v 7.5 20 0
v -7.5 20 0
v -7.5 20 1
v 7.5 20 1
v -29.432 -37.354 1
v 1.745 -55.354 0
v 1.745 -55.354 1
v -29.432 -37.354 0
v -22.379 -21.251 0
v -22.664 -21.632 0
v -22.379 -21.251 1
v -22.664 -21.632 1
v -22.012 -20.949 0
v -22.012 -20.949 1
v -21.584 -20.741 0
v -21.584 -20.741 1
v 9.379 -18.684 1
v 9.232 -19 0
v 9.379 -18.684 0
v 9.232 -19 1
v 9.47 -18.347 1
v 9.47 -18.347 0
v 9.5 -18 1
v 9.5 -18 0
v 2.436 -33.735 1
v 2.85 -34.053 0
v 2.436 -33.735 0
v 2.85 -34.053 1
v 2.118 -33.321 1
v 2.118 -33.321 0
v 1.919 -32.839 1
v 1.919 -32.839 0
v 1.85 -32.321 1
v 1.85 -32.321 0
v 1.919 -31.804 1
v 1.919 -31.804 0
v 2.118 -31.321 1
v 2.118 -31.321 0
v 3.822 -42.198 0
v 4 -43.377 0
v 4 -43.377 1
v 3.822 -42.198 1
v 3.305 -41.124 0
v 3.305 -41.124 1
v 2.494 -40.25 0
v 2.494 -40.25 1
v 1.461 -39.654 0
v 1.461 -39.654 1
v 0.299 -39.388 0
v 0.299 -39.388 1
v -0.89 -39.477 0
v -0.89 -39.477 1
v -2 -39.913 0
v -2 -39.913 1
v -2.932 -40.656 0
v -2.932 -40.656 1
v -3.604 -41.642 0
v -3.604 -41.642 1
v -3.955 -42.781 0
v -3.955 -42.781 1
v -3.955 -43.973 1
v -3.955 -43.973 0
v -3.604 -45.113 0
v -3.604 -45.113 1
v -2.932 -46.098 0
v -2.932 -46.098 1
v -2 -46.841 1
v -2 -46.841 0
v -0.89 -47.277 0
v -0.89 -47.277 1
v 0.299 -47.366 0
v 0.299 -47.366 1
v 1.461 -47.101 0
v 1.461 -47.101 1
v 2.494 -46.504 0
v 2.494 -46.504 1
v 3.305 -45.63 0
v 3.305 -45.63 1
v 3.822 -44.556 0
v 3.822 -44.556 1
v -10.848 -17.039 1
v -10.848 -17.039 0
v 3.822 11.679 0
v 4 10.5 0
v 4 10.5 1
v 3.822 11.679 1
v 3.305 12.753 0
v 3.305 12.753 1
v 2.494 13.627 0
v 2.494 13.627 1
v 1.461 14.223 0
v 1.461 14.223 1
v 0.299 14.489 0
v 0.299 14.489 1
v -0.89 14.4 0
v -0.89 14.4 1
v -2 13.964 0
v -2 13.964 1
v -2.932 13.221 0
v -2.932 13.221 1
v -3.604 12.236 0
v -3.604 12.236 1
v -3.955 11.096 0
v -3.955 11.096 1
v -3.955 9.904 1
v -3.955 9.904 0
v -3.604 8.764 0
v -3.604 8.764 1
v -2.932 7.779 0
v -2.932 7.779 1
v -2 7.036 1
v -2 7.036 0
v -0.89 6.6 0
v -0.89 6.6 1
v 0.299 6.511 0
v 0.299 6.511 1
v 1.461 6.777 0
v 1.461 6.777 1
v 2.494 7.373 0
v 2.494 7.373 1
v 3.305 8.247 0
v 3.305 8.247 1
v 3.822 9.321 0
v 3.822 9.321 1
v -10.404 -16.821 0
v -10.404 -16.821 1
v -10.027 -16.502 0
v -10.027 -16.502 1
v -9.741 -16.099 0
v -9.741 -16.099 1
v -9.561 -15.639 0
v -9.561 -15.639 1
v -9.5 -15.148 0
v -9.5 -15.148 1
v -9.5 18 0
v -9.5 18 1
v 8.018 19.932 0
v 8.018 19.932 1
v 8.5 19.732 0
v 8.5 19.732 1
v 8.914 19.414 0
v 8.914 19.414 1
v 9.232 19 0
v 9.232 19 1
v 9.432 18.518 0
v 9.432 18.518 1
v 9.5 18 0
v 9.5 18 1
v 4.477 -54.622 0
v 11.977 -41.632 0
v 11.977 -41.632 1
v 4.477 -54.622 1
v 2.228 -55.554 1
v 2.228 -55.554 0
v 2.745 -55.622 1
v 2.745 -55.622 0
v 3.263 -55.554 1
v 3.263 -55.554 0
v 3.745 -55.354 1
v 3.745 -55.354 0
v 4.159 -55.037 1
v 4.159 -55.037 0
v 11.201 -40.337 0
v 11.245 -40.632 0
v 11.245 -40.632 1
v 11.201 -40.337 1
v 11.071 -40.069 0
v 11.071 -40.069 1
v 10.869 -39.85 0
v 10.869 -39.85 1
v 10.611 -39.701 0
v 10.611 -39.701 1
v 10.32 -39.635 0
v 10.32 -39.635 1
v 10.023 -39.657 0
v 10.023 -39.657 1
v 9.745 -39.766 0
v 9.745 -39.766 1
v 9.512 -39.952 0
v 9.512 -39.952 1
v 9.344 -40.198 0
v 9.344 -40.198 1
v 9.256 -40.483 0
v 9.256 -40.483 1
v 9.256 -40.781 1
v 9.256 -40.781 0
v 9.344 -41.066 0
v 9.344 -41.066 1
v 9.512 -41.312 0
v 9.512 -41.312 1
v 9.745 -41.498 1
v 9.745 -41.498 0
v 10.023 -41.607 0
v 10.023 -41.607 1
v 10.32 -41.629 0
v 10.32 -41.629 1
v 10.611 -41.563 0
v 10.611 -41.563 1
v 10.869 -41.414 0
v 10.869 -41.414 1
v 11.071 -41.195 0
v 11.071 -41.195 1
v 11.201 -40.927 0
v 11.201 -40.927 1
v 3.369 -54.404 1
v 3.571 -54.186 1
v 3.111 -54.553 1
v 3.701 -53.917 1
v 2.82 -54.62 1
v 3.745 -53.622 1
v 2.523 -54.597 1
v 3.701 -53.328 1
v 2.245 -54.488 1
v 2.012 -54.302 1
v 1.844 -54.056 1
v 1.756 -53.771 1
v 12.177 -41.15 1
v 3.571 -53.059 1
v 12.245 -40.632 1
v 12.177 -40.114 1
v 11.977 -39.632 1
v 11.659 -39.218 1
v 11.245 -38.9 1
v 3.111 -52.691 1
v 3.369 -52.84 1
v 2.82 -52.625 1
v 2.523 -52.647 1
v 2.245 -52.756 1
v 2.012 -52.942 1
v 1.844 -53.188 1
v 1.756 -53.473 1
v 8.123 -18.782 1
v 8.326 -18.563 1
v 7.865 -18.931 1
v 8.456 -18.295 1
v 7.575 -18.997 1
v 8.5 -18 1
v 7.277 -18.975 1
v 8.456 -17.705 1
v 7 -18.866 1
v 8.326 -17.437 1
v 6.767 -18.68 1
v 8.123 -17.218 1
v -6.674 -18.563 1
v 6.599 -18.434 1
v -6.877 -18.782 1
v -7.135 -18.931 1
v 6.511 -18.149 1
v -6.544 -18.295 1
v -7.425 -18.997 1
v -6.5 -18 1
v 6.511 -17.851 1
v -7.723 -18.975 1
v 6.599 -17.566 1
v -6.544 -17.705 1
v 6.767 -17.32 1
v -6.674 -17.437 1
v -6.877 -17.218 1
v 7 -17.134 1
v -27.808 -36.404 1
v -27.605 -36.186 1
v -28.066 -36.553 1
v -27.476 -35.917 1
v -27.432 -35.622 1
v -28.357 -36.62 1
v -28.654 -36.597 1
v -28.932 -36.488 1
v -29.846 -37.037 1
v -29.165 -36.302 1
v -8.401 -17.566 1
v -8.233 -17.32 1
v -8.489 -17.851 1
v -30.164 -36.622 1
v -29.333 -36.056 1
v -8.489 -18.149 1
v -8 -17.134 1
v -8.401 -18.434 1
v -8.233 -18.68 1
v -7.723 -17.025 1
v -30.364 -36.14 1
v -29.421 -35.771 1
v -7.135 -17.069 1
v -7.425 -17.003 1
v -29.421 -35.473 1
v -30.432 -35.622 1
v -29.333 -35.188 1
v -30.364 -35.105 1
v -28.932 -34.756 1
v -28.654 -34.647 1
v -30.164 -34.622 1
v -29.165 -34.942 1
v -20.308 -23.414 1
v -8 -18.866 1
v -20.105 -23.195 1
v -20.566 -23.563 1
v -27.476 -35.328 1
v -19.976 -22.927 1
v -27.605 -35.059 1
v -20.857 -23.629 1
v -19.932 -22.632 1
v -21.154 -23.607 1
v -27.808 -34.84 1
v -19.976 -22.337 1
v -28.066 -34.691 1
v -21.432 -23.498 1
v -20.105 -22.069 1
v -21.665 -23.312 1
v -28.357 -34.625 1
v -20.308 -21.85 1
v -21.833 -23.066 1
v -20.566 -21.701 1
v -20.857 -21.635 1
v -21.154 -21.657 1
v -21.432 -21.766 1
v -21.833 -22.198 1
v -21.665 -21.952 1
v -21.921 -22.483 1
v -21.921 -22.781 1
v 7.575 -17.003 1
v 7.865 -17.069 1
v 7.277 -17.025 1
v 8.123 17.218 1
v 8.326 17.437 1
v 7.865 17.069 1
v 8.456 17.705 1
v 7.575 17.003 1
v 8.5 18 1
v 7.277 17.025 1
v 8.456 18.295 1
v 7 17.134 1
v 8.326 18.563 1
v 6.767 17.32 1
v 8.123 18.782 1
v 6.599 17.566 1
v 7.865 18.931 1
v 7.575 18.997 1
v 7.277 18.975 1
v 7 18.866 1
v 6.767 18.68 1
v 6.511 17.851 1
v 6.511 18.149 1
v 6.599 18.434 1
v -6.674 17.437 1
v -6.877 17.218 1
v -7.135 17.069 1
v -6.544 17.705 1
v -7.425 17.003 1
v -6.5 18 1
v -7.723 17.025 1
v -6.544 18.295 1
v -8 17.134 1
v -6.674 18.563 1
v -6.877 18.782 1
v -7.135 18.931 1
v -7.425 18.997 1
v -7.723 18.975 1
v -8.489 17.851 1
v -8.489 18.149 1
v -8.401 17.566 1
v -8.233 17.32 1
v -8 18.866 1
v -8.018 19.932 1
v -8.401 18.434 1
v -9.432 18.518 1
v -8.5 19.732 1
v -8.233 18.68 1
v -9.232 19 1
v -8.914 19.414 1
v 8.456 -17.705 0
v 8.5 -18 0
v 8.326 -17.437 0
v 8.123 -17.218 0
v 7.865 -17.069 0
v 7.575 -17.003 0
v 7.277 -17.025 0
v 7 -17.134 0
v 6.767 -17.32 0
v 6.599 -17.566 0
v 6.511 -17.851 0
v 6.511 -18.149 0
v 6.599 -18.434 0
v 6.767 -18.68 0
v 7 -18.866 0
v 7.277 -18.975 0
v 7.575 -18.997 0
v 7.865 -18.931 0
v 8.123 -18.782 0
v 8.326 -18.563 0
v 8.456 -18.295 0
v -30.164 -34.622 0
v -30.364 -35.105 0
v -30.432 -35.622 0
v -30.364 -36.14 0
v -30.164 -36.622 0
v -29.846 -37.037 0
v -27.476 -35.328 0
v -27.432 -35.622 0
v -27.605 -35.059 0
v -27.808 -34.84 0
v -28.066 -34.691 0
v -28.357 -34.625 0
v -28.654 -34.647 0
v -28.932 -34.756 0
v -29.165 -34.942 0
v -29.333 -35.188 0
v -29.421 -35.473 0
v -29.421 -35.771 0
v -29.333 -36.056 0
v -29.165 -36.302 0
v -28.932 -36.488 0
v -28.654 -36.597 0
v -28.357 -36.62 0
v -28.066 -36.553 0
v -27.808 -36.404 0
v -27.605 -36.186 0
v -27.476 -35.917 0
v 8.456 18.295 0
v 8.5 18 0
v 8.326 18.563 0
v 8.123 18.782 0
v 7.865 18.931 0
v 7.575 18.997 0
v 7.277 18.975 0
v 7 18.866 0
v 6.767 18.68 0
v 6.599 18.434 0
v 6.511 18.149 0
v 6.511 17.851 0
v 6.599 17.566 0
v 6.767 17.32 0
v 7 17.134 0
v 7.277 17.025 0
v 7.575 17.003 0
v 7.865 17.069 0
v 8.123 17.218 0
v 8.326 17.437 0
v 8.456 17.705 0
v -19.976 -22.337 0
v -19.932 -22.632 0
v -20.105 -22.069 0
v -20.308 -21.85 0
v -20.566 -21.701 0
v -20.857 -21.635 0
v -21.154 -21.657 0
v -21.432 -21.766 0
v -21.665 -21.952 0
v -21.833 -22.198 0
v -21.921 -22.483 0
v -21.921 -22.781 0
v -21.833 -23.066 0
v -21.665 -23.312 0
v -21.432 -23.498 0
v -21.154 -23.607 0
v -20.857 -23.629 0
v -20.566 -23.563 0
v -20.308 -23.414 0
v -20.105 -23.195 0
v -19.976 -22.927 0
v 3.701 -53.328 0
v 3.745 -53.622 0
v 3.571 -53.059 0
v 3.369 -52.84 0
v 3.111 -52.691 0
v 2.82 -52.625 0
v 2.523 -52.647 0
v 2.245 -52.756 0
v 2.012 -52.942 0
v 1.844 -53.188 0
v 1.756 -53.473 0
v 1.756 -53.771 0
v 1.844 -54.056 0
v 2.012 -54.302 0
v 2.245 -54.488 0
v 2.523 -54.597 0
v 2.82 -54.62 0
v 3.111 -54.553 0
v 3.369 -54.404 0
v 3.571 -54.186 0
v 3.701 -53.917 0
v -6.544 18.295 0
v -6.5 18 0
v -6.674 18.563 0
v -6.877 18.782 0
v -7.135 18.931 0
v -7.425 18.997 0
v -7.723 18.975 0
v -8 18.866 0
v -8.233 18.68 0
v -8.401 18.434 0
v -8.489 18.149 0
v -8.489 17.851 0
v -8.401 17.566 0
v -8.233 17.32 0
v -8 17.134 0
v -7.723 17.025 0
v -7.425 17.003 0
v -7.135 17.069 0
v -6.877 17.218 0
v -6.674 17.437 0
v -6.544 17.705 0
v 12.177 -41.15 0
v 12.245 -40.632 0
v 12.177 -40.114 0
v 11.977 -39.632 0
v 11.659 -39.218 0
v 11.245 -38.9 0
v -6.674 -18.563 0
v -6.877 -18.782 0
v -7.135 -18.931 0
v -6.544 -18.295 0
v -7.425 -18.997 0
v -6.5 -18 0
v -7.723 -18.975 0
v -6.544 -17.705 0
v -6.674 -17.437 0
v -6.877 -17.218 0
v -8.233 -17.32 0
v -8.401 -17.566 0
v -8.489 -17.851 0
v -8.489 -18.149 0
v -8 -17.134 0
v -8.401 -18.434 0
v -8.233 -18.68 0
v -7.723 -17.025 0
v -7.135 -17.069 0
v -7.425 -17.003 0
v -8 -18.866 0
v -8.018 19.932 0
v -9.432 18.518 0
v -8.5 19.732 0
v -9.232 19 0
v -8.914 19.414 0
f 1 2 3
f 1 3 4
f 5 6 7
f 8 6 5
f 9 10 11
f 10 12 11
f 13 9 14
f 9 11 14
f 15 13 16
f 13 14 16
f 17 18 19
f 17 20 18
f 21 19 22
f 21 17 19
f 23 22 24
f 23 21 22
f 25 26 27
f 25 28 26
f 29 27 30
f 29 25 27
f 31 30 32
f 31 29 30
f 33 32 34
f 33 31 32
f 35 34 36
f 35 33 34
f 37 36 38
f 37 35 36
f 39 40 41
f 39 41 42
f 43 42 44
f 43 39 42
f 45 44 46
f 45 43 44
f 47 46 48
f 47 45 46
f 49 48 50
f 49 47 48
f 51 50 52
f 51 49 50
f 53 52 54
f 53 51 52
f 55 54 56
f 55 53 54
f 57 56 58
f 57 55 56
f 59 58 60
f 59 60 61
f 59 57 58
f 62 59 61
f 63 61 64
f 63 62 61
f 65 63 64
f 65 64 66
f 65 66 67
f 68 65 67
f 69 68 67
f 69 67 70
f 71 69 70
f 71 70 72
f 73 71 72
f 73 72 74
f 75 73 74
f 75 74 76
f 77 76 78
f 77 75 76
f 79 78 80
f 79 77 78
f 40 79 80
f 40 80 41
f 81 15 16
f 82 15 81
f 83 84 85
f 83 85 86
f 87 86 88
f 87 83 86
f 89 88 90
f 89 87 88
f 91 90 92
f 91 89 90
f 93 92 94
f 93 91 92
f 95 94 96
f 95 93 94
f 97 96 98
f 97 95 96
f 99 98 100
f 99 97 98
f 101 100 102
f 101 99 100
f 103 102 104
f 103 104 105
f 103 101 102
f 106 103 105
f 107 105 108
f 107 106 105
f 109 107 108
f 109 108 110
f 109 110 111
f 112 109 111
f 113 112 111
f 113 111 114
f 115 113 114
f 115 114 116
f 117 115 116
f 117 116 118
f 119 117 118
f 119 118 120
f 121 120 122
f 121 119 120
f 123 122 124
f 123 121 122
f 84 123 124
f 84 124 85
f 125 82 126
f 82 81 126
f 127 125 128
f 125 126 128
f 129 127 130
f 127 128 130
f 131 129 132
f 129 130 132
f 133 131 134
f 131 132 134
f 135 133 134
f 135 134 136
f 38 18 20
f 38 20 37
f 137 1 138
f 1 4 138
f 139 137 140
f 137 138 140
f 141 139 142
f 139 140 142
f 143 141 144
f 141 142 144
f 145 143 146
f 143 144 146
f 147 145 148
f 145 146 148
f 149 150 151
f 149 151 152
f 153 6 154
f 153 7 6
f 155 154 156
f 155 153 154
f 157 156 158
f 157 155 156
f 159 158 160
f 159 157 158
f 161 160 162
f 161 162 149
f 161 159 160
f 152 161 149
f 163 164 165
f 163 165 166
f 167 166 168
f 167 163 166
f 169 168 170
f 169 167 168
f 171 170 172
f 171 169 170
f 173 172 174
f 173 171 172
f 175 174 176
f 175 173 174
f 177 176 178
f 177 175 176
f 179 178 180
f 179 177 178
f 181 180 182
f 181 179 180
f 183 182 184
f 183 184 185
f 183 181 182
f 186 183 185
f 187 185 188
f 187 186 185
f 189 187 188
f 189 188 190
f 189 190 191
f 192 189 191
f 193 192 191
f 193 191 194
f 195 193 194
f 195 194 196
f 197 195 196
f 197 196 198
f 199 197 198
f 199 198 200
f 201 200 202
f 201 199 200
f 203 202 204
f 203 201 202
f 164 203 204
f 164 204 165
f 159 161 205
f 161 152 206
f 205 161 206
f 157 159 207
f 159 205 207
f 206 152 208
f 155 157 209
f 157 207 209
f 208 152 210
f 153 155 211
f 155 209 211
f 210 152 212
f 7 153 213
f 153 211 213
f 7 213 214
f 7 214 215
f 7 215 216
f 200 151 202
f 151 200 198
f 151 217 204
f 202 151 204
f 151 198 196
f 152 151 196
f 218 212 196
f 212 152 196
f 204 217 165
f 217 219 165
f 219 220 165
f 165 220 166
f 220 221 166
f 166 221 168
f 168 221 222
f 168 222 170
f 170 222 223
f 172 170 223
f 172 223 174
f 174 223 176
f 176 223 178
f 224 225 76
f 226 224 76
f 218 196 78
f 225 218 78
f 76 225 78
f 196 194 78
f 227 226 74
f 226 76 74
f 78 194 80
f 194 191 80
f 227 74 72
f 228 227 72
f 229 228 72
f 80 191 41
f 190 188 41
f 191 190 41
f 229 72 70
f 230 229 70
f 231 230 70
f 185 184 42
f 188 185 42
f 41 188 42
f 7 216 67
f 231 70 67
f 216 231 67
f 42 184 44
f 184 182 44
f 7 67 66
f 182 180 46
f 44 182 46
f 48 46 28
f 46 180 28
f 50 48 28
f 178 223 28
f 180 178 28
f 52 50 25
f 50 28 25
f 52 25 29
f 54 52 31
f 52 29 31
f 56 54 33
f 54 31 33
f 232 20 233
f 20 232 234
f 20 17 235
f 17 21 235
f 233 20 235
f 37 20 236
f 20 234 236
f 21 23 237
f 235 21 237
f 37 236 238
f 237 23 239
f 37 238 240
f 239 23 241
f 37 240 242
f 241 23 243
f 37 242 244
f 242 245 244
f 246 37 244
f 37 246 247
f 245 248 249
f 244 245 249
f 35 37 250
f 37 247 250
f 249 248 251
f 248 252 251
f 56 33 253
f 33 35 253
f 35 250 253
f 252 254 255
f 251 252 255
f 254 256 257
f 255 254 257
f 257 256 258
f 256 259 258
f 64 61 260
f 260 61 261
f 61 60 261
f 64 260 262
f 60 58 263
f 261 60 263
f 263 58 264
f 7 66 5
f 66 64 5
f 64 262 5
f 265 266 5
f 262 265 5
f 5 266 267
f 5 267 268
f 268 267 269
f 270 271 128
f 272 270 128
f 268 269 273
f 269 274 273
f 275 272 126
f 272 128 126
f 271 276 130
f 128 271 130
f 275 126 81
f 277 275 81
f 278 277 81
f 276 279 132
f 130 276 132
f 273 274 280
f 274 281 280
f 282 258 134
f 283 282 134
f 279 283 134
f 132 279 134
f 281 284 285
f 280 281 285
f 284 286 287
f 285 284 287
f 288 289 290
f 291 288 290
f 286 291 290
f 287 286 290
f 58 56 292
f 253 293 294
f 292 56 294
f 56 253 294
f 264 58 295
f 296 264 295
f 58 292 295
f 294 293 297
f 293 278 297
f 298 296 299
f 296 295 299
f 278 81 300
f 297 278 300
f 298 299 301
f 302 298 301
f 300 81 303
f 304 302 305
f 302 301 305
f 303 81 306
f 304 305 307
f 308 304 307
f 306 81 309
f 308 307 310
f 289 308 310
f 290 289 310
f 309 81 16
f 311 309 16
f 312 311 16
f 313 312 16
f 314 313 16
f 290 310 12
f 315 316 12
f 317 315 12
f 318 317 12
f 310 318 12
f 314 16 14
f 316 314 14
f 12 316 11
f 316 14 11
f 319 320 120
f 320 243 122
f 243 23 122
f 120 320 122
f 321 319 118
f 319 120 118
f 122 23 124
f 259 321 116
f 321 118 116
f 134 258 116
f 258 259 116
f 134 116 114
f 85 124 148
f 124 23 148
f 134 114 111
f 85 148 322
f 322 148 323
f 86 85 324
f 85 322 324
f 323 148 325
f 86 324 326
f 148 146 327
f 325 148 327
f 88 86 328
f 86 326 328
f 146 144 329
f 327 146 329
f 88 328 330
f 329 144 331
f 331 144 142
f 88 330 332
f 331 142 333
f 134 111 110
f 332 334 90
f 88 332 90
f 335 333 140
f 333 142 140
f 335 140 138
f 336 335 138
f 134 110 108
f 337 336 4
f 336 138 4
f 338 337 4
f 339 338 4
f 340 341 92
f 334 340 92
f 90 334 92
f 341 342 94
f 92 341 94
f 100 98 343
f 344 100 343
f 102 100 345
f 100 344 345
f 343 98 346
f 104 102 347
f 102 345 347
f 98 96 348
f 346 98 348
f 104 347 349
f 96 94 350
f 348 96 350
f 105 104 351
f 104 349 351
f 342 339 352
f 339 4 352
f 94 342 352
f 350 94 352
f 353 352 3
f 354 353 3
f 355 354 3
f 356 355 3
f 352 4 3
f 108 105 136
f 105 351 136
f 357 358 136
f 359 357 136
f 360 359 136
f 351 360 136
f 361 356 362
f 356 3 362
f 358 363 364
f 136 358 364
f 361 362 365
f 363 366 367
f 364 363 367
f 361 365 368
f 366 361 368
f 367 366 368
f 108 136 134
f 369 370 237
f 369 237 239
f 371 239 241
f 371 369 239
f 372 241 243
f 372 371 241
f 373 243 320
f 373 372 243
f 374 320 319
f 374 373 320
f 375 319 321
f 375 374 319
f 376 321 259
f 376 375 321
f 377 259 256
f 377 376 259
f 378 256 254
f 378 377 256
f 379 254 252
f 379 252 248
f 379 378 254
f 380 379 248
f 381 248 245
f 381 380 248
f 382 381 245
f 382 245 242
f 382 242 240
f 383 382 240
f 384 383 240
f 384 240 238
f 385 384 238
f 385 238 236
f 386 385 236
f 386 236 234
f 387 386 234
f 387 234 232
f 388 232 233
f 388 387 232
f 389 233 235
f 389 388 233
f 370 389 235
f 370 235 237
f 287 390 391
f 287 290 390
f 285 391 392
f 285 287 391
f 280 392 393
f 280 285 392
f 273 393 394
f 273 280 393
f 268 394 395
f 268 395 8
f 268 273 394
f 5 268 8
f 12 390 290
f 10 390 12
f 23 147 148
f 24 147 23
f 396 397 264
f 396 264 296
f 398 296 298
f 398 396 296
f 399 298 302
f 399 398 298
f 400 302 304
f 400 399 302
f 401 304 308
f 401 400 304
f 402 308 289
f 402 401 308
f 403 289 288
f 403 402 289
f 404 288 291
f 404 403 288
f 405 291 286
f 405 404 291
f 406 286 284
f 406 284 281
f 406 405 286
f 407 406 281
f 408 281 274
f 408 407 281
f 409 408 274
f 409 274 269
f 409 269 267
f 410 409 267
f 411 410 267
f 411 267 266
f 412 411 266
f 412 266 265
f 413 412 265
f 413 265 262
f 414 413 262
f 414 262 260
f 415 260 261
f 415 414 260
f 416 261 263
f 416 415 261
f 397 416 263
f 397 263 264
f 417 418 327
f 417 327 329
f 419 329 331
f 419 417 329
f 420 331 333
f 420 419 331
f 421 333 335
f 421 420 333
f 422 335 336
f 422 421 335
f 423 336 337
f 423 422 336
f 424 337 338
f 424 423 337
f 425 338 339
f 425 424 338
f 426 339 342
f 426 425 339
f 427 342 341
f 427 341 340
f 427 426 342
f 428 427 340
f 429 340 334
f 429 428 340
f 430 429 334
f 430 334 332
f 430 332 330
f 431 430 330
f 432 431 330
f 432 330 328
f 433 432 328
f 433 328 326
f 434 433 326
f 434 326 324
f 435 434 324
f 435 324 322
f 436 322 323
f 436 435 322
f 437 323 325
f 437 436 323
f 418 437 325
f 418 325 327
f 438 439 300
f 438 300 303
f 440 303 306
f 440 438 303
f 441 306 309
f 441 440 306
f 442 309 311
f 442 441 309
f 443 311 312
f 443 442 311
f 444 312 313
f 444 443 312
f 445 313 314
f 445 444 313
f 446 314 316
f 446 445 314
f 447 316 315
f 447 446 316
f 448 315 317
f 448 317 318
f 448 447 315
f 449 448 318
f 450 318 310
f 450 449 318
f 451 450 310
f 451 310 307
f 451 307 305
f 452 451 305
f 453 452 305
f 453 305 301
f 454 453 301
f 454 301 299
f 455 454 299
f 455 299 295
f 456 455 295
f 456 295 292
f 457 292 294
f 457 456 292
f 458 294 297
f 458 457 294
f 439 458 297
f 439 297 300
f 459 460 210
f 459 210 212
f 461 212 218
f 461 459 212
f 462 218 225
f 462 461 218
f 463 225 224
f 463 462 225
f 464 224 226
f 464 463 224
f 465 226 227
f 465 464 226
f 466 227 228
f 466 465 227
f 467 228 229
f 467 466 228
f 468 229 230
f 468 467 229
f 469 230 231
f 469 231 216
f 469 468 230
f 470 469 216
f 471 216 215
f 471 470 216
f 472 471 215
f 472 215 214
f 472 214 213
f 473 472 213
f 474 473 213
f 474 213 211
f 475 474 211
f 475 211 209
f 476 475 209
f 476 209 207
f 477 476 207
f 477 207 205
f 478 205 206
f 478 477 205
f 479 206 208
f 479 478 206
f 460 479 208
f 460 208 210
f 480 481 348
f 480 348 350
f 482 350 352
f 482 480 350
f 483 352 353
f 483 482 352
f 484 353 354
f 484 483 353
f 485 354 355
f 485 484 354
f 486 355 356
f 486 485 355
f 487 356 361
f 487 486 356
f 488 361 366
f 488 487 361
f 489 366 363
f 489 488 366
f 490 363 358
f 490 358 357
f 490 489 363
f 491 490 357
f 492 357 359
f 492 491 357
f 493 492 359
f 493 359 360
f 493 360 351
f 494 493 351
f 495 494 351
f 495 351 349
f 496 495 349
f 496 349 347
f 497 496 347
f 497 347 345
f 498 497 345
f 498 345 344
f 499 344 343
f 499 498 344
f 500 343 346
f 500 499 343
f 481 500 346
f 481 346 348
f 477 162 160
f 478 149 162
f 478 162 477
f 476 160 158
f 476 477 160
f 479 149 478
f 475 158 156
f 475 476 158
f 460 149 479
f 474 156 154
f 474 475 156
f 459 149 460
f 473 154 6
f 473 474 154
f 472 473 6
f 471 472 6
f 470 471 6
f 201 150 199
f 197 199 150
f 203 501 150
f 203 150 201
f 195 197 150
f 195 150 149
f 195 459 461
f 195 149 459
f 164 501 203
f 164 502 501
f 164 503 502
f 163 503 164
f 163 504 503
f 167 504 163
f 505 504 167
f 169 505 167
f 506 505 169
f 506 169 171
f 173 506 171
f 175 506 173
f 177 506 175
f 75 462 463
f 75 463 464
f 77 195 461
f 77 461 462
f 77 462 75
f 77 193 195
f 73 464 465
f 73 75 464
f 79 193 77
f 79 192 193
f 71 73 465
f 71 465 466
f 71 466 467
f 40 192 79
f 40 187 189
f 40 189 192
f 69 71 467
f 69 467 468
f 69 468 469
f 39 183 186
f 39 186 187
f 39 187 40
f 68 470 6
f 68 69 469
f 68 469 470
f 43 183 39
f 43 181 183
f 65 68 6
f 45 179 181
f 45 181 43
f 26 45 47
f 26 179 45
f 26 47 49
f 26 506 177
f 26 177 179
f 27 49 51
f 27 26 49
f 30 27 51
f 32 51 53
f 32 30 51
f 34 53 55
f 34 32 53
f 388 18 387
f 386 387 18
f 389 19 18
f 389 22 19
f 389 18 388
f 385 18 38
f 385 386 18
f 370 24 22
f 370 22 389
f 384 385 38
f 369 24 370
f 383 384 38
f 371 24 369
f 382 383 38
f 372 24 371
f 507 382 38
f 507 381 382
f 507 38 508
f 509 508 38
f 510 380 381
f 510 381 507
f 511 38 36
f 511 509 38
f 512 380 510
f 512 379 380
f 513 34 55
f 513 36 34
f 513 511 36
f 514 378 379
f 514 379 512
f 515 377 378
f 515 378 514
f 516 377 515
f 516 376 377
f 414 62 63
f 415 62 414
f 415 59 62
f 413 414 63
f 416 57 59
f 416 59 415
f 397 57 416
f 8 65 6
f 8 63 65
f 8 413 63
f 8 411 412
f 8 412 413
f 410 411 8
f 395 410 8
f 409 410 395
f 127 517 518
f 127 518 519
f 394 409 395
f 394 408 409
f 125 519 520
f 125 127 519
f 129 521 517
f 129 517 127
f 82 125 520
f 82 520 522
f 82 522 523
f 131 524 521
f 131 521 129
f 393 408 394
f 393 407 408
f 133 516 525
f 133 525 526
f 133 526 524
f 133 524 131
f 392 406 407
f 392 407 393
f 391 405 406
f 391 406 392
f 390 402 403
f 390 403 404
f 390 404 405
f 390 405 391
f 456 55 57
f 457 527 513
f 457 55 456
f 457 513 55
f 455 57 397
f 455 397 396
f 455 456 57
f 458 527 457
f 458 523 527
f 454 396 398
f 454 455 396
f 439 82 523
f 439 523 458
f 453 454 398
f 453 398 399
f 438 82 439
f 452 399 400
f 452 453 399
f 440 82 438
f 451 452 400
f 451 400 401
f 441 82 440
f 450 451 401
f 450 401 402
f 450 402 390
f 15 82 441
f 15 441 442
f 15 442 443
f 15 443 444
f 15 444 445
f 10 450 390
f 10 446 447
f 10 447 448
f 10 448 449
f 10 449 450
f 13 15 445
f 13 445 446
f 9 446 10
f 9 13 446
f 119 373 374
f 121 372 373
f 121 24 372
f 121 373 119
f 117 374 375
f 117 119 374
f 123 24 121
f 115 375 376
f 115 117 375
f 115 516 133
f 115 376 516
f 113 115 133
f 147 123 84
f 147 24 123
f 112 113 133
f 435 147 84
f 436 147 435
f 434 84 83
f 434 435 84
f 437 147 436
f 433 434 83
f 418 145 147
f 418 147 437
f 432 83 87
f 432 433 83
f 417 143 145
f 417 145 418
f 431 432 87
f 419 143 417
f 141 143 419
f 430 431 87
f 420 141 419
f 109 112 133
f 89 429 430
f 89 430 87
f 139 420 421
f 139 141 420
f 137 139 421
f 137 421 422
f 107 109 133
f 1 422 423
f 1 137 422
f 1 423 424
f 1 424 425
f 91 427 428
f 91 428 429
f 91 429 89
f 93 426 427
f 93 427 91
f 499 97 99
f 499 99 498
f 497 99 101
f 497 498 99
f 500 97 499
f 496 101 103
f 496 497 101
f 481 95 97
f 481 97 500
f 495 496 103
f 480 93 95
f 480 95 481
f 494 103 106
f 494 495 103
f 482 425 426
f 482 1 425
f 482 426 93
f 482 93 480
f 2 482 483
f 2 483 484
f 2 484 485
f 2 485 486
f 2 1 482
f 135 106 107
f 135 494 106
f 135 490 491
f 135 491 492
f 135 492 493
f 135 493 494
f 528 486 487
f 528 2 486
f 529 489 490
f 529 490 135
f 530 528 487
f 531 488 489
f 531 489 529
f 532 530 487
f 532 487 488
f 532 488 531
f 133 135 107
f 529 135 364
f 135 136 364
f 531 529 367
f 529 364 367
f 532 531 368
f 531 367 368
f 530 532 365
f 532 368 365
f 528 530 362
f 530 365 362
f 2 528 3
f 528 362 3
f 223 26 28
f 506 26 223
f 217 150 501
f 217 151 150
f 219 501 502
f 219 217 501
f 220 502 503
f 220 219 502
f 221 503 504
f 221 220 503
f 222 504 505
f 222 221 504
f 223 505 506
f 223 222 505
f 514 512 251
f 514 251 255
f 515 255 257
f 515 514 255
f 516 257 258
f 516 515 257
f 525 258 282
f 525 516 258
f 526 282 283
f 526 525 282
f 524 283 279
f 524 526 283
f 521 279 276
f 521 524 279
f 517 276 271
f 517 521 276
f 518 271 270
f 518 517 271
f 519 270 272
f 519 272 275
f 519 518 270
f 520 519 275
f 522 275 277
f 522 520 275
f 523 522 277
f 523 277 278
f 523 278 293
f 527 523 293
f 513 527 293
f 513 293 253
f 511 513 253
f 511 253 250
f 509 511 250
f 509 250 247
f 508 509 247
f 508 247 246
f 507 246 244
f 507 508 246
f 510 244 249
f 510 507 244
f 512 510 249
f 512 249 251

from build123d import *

# Parameters (mm, degrees)
SKETCH1_R           = 1
BOSS_EXTRUDE1_DEPTH = 1
FILLET1_R           = 2


with BuildPart() as part:
    # Sketch1 → Boss-Extrude1 (new body)
    with BuildSketch(Plane.XY):
        Polygon((-9.5, 20), (-9.5, -16.574119451), (-22.29015667, -20.984816263), (-31.163774815, -36.354373739), (3.477241336, -56.354373739), (12.977241336, -39.899891067), (1.11843014, -33.05320323), (9.5, -18.535898385), (9.5, 20), align=None)
        with Locations((-28.431724008, -35.622322931)):
            Circle(SKETCH1_R, mode=Mode.SUBTRACT)
        with BuildLine():
            ThreePointArc((-20.065698604, -23.131941874), (-21.897649834, -22.373122829), (-19.931724008, -22.631941874))
            ThreePointArc((-19.931724008, -22.631941874), (-19.965798182, -22.890760919), (-20.065698604, -23.131941874))
        make_face(mode=Mode.SUBTRACT)
        with BuildLine():
            ThreePointArc((4, -43.377132403), (-2.828427125, -46.205559527), (0, -39.377132403))
            ThreePointArc((0, -39.377132403), (2.828427125, -40.548705278), (4, -43.377132403))
        make_face(mode=Mode.SUBTRACT)
        with Locations((2.745190528, -53.622322931)):
            Circle(SKETCH1_R, mode=Mode.SUBTRACT)
        with Locations((10.245190528, -40.631941874)):
            Circle(SKETCH1_R, mode=Mode.SUBTRACT)
        with Locations((-7.5, -18)):
            Circle(SKETCH1_R, mode=Mode.SUBTRACT)
        with Locations((7.5, -18)):
            Circle(SKETCH1_R, mode=Mode.SUBTRACT)
        with Locations((-7.5, 18)):
            Circle(SKETCH1_R, mode=Mode.SUBTRACT)
        with BuildLine():
            ThreePointArc((4, 10.5), (2.828427125, 7.671572875), (0, 6.5))
            ThreePointArc((0, 6.5), (-2.828427125, 13.328427125), (4, 10.5))
        make_face(mode=Mode.SUBTRACT)
        with Locations((7.5, 18)):
            Circle(SKETCH1_R, mode=Mode.SUBTRACT)
    extrude(amount=BOSS_EXTRUDE1_DEPTH)

    # Fillet1
    fillet1_edges = [part.edges().sort_by_distance(p)[0] for p in [
        (-9.5, 20, 0.5),
        (9.5, 20, 0.5),
        (9.5, -18.535898385, 0.5),
        (-22.29015667, -20.984816263, 0.5),
        (-31.163774815, -36.354373739, 0.5),
        (3.477241336, -56.354373739, 0.5),
        (12.977241336, -39.899891067, 0.5),
        (1.11843014, -33.05320323, 0.5),
        (-9.5, -16.574119451, 0.5),
    ]]
    fillet(fillet1_edges, radius=FILLET1_R)


solid = part.part
